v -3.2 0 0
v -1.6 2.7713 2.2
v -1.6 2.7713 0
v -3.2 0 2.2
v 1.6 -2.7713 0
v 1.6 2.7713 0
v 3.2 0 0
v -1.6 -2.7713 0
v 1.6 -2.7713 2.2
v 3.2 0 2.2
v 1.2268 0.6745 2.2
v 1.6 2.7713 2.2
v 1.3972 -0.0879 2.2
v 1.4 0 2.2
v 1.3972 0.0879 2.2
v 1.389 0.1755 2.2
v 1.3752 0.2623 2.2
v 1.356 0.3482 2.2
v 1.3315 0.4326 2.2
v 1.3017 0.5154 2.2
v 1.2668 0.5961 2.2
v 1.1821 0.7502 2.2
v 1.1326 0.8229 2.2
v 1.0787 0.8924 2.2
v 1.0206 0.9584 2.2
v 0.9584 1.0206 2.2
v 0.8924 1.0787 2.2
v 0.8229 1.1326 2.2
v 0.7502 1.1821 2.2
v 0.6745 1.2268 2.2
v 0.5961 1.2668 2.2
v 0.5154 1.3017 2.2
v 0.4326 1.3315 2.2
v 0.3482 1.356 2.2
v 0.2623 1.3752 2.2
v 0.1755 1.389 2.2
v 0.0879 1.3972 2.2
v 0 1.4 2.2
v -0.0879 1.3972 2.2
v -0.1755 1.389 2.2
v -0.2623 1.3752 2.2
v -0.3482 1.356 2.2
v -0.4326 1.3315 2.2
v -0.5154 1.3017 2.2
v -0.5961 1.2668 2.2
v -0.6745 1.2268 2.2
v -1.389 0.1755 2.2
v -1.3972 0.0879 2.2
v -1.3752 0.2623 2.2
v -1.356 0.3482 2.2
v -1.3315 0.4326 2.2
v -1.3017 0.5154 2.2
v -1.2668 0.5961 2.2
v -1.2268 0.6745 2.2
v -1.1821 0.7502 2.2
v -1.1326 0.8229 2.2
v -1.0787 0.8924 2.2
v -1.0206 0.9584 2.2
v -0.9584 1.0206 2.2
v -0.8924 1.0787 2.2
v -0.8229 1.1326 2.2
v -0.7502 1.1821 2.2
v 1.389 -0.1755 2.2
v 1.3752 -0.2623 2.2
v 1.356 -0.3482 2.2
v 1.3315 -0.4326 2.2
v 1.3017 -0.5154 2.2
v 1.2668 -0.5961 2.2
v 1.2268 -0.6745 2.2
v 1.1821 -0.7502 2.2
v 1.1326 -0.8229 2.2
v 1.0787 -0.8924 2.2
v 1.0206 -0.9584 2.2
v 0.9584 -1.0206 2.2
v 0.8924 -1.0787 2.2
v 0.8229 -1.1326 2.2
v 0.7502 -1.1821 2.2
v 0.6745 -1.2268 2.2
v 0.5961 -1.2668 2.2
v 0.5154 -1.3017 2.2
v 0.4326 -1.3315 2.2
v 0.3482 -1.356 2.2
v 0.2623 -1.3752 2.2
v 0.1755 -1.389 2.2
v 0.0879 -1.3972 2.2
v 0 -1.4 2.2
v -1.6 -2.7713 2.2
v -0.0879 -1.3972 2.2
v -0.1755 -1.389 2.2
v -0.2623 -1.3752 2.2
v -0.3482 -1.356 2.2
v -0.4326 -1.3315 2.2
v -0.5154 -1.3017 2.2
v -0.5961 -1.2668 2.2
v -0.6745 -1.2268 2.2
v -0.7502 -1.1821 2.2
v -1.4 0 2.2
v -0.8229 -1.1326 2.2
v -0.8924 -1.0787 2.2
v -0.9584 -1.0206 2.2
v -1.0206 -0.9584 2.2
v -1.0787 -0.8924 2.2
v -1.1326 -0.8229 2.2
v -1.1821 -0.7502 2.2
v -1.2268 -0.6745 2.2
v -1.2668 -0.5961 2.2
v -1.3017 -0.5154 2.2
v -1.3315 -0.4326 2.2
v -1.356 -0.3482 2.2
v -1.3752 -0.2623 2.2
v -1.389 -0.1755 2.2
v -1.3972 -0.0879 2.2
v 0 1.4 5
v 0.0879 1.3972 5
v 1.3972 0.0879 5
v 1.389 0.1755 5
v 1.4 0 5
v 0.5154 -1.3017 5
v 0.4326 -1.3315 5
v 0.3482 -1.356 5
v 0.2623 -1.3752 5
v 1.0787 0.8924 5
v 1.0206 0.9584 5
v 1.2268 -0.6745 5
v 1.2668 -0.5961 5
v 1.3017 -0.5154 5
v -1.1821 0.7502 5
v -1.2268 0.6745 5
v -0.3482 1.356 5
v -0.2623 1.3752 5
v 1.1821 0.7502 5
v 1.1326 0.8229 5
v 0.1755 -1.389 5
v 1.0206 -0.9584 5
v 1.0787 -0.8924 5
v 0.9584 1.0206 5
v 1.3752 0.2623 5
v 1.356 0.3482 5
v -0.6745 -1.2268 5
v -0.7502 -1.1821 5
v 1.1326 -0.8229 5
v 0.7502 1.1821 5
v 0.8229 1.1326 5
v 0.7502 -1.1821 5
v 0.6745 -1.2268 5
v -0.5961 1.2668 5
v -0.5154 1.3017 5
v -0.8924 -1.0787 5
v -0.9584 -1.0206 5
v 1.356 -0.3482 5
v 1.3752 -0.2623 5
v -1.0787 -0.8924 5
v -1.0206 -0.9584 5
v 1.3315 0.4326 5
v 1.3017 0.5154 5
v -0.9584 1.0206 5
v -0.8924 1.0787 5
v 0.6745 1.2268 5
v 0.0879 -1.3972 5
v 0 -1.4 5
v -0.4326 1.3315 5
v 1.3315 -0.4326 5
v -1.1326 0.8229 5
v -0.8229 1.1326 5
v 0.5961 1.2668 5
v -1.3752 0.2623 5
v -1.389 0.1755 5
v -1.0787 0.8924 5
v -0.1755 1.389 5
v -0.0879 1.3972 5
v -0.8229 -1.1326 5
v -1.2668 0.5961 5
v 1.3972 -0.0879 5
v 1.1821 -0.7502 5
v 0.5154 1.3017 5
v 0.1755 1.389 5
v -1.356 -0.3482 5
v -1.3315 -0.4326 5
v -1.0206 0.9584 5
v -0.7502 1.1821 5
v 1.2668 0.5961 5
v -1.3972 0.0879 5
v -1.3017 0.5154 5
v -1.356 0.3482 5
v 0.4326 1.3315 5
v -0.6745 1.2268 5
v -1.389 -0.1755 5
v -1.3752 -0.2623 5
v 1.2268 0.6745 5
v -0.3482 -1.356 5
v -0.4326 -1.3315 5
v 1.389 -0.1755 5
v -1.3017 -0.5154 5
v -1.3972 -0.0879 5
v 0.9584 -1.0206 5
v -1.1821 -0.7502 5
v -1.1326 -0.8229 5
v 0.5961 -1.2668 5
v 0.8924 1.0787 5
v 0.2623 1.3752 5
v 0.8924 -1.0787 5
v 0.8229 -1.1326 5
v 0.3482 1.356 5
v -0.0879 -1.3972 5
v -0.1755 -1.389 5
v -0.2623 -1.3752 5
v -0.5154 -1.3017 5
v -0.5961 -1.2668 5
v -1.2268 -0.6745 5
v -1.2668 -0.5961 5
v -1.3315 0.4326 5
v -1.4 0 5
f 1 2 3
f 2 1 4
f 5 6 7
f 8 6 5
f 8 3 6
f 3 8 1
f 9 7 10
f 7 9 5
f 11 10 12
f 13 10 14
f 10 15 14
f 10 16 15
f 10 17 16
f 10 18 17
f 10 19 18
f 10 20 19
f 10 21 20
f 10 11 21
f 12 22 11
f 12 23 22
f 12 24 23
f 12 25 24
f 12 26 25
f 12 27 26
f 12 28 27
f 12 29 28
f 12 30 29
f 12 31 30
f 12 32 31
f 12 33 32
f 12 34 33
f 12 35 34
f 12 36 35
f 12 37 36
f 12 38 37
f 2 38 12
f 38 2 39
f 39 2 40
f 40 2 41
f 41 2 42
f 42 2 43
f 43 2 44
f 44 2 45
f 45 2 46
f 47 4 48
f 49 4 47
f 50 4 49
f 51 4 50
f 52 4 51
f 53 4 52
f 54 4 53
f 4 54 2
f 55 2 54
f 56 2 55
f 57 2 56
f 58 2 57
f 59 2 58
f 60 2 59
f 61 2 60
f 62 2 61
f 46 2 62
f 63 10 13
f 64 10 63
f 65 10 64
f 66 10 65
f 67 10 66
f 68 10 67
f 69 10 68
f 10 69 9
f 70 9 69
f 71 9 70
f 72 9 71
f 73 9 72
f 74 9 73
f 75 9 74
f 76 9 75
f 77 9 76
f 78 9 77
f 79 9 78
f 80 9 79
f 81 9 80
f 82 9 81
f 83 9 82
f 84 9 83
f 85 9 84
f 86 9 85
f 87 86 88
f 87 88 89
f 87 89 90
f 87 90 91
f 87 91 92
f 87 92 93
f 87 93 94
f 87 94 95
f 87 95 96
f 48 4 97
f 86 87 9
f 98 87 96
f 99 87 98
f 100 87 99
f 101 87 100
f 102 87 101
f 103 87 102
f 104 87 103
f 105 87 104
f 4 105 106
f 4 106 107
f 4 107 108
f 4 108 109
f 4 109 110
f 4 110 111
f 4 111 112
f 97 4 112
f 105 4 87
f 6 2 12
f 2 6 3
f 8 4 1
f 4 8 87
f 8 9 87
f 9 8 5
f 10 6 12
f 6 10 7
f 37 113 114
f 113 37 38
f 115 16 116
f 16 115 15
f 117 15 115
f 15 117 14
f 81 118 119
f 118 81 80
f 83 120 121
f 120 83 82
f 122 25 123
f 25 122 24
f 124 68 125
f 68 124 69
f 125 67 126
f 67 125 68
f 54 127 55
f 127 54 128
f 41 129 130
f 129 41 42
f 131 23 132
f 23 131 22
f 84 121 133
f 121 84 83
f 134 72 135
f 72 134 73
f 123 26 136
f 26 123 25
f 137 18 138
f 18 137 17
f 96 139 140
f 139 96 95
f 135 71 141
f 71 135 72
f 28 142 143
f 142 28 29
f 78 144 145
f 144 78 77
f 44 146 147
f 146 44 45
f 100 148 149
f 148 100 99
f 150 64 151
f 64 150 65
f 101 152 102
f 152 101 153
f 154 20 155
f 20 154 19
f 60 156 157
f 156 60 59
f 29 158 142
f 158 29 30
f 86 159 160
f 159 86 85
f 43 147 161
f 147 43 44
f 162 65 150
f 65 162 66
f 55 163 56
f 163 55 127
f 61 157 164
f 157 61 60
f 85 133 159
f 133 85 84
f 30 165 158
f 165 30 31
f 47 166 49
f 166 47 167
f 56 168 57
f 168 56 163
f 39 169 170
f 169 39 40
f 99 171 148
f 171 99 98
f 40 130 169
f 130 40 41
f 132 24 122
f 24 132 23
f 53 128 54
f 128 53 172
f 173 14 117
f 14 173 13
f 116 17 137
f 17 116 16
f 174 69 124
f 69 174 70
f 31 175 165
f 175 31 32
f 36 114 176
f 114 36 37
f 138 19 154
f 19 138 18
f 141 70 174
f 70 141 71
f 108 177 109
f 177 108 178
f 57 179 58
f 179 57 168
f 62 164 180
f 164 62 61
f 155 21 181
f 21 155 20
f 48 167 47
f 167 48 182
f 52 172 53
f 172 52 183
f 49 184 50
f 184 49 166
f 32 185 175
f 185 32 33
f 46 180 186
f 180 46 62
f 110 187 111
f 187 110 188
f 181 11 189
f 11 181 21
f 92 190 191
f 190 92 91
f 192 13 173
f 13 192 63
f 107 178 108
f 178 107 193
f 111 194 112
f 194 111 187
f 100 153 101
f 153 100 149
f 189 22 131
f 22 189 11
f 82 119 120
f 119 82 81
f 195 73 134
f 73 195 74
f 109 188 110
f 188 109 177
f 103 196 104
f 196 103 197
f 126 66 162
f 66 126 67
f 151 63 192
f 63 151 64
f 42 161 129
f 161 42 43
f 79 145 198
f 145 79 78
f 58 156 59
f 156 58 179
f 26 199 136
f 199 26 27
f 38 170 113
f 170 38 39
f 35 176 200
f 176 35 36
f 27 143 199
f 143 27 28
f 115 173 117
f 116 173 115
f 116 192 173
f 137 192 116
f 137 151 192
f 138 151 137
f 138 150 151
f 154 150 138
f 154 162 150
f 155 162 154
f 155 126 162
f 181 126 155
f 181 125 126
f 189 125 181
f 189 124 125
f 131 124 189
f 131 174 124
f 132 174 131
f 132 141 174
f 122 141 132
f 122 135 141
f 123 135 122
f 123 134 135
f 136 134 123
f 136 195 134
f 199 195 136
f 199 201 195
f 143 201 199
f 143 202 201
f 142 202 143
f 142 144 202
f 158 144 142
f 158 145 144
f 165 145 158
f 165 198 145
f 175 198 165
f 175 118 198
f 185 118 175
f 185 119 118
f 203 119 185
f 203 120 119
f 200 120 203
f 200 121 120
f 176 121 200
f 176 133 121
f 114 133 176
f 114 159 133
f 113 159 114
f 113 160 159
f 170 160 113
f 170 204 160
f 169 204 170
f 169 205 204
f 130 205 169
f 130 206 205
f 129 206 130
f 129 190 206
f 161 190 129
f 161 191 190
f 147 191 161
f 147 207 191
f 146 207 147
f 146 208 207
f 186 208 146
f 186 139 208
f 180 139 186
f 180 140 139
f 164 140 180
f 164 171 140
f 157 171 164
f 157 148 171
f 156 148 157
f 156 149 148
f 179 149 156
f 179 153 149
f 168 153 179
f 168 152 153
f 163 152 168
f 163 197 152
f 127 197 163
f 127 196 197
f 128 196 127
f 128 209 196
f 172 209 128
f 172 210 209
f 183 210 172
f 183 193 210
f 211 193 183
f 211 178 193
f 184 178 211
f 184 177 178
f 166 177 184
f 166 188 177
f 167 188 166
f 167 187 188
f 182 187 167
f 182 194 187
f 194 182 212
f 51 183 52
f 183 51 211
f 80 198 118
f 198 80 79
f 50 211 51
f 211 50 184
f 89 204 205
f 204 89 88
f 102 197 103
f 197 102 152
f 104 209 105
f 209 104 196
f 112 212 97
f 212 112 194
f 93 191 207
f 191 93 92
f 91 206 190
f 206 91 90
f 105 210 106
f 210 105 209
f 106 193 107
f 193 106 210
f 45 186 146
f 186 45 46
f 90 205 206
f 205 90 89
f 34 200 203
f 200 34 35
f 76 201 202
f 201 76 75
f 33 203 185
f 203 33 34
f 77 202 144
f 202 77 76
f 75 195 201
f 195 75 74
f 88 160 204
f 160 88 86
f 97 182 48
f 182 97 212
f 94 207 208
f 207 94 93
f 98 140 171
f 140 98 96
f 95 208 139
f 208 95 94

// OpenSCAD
module nut(n, h, r) {
    s = 360/n;
    linear_extrude(h) polygon([for (i = [0:n-1]) [r*cos(i*s), r*sin(i*s)]]);
}

module hexNut(h, r) {
    nut(6, h, r);
}

module hexNutM25(h = 2.2, r = 3.2) {
    hexNut(h, r);
}

module hexNutScrewM25(h, nutH = 2.2, screwD = 2.8) {
    hexNutM25(nutH);
    cylinder(h = h, d = screwD);
}

module gear(r, n, h) {
    s = 360/n/2;
    linear_extrude(h) polygon([for (i = [0:n*2-1]) [r[i%2]*cos(i*s), r[i%2]*sin(i*s)]]);
}

module bearBall(r = 3) {
    sphere(r);
}

hookBaseH = 4;  // base height of hook
hookBaseL = 4;  // length of hook
hookBaseD = 2;  // depth of hook
hookSizeH = 2;
hookSizeD = 2;

function makeHook(baseH, baseL = 4, baseD = 2, sizeH = 2, sizeD = 2) = [baseH, baseL, baseD, sizeH, sizeD];

module hook(params) {
    baseH = params[0];
    baseL = params[1];
    baseD = params[2];
    sizeH = params[3];
    sizeD = params[4];

    rotate([0, 90, 90]) translate([0, 0, -baseL/2])
    linear_extrude(height = baseL) polygon([
        [sizeH, 0],
        [0, -sizeD],
        [0, 0],
        [-baseH, 0],
        [-baseH, baseD],
        [sizeH, baseD]
    ]);
}

function hookLocTop(params) = [0, 0, -params[0]];
function hookLocL(params) = [0, params[1]/2, 0];
function hookLocR(params) = [0, -params[1]/2, 0];
function hookLocBack(params) = [params[2], 0, 0];
function hookLocBottom(params) = [0, 0, params[3]];
function hookLocFront(params) = [-params[4], 0, 0];
function hookLocMid(params) = [params[2]/2, 0, 0];
function hookLocBaseCenter(params) = [0, 0, -params[0]/2];

$fn = 100;

hexNutScrewM25(h = 5);
